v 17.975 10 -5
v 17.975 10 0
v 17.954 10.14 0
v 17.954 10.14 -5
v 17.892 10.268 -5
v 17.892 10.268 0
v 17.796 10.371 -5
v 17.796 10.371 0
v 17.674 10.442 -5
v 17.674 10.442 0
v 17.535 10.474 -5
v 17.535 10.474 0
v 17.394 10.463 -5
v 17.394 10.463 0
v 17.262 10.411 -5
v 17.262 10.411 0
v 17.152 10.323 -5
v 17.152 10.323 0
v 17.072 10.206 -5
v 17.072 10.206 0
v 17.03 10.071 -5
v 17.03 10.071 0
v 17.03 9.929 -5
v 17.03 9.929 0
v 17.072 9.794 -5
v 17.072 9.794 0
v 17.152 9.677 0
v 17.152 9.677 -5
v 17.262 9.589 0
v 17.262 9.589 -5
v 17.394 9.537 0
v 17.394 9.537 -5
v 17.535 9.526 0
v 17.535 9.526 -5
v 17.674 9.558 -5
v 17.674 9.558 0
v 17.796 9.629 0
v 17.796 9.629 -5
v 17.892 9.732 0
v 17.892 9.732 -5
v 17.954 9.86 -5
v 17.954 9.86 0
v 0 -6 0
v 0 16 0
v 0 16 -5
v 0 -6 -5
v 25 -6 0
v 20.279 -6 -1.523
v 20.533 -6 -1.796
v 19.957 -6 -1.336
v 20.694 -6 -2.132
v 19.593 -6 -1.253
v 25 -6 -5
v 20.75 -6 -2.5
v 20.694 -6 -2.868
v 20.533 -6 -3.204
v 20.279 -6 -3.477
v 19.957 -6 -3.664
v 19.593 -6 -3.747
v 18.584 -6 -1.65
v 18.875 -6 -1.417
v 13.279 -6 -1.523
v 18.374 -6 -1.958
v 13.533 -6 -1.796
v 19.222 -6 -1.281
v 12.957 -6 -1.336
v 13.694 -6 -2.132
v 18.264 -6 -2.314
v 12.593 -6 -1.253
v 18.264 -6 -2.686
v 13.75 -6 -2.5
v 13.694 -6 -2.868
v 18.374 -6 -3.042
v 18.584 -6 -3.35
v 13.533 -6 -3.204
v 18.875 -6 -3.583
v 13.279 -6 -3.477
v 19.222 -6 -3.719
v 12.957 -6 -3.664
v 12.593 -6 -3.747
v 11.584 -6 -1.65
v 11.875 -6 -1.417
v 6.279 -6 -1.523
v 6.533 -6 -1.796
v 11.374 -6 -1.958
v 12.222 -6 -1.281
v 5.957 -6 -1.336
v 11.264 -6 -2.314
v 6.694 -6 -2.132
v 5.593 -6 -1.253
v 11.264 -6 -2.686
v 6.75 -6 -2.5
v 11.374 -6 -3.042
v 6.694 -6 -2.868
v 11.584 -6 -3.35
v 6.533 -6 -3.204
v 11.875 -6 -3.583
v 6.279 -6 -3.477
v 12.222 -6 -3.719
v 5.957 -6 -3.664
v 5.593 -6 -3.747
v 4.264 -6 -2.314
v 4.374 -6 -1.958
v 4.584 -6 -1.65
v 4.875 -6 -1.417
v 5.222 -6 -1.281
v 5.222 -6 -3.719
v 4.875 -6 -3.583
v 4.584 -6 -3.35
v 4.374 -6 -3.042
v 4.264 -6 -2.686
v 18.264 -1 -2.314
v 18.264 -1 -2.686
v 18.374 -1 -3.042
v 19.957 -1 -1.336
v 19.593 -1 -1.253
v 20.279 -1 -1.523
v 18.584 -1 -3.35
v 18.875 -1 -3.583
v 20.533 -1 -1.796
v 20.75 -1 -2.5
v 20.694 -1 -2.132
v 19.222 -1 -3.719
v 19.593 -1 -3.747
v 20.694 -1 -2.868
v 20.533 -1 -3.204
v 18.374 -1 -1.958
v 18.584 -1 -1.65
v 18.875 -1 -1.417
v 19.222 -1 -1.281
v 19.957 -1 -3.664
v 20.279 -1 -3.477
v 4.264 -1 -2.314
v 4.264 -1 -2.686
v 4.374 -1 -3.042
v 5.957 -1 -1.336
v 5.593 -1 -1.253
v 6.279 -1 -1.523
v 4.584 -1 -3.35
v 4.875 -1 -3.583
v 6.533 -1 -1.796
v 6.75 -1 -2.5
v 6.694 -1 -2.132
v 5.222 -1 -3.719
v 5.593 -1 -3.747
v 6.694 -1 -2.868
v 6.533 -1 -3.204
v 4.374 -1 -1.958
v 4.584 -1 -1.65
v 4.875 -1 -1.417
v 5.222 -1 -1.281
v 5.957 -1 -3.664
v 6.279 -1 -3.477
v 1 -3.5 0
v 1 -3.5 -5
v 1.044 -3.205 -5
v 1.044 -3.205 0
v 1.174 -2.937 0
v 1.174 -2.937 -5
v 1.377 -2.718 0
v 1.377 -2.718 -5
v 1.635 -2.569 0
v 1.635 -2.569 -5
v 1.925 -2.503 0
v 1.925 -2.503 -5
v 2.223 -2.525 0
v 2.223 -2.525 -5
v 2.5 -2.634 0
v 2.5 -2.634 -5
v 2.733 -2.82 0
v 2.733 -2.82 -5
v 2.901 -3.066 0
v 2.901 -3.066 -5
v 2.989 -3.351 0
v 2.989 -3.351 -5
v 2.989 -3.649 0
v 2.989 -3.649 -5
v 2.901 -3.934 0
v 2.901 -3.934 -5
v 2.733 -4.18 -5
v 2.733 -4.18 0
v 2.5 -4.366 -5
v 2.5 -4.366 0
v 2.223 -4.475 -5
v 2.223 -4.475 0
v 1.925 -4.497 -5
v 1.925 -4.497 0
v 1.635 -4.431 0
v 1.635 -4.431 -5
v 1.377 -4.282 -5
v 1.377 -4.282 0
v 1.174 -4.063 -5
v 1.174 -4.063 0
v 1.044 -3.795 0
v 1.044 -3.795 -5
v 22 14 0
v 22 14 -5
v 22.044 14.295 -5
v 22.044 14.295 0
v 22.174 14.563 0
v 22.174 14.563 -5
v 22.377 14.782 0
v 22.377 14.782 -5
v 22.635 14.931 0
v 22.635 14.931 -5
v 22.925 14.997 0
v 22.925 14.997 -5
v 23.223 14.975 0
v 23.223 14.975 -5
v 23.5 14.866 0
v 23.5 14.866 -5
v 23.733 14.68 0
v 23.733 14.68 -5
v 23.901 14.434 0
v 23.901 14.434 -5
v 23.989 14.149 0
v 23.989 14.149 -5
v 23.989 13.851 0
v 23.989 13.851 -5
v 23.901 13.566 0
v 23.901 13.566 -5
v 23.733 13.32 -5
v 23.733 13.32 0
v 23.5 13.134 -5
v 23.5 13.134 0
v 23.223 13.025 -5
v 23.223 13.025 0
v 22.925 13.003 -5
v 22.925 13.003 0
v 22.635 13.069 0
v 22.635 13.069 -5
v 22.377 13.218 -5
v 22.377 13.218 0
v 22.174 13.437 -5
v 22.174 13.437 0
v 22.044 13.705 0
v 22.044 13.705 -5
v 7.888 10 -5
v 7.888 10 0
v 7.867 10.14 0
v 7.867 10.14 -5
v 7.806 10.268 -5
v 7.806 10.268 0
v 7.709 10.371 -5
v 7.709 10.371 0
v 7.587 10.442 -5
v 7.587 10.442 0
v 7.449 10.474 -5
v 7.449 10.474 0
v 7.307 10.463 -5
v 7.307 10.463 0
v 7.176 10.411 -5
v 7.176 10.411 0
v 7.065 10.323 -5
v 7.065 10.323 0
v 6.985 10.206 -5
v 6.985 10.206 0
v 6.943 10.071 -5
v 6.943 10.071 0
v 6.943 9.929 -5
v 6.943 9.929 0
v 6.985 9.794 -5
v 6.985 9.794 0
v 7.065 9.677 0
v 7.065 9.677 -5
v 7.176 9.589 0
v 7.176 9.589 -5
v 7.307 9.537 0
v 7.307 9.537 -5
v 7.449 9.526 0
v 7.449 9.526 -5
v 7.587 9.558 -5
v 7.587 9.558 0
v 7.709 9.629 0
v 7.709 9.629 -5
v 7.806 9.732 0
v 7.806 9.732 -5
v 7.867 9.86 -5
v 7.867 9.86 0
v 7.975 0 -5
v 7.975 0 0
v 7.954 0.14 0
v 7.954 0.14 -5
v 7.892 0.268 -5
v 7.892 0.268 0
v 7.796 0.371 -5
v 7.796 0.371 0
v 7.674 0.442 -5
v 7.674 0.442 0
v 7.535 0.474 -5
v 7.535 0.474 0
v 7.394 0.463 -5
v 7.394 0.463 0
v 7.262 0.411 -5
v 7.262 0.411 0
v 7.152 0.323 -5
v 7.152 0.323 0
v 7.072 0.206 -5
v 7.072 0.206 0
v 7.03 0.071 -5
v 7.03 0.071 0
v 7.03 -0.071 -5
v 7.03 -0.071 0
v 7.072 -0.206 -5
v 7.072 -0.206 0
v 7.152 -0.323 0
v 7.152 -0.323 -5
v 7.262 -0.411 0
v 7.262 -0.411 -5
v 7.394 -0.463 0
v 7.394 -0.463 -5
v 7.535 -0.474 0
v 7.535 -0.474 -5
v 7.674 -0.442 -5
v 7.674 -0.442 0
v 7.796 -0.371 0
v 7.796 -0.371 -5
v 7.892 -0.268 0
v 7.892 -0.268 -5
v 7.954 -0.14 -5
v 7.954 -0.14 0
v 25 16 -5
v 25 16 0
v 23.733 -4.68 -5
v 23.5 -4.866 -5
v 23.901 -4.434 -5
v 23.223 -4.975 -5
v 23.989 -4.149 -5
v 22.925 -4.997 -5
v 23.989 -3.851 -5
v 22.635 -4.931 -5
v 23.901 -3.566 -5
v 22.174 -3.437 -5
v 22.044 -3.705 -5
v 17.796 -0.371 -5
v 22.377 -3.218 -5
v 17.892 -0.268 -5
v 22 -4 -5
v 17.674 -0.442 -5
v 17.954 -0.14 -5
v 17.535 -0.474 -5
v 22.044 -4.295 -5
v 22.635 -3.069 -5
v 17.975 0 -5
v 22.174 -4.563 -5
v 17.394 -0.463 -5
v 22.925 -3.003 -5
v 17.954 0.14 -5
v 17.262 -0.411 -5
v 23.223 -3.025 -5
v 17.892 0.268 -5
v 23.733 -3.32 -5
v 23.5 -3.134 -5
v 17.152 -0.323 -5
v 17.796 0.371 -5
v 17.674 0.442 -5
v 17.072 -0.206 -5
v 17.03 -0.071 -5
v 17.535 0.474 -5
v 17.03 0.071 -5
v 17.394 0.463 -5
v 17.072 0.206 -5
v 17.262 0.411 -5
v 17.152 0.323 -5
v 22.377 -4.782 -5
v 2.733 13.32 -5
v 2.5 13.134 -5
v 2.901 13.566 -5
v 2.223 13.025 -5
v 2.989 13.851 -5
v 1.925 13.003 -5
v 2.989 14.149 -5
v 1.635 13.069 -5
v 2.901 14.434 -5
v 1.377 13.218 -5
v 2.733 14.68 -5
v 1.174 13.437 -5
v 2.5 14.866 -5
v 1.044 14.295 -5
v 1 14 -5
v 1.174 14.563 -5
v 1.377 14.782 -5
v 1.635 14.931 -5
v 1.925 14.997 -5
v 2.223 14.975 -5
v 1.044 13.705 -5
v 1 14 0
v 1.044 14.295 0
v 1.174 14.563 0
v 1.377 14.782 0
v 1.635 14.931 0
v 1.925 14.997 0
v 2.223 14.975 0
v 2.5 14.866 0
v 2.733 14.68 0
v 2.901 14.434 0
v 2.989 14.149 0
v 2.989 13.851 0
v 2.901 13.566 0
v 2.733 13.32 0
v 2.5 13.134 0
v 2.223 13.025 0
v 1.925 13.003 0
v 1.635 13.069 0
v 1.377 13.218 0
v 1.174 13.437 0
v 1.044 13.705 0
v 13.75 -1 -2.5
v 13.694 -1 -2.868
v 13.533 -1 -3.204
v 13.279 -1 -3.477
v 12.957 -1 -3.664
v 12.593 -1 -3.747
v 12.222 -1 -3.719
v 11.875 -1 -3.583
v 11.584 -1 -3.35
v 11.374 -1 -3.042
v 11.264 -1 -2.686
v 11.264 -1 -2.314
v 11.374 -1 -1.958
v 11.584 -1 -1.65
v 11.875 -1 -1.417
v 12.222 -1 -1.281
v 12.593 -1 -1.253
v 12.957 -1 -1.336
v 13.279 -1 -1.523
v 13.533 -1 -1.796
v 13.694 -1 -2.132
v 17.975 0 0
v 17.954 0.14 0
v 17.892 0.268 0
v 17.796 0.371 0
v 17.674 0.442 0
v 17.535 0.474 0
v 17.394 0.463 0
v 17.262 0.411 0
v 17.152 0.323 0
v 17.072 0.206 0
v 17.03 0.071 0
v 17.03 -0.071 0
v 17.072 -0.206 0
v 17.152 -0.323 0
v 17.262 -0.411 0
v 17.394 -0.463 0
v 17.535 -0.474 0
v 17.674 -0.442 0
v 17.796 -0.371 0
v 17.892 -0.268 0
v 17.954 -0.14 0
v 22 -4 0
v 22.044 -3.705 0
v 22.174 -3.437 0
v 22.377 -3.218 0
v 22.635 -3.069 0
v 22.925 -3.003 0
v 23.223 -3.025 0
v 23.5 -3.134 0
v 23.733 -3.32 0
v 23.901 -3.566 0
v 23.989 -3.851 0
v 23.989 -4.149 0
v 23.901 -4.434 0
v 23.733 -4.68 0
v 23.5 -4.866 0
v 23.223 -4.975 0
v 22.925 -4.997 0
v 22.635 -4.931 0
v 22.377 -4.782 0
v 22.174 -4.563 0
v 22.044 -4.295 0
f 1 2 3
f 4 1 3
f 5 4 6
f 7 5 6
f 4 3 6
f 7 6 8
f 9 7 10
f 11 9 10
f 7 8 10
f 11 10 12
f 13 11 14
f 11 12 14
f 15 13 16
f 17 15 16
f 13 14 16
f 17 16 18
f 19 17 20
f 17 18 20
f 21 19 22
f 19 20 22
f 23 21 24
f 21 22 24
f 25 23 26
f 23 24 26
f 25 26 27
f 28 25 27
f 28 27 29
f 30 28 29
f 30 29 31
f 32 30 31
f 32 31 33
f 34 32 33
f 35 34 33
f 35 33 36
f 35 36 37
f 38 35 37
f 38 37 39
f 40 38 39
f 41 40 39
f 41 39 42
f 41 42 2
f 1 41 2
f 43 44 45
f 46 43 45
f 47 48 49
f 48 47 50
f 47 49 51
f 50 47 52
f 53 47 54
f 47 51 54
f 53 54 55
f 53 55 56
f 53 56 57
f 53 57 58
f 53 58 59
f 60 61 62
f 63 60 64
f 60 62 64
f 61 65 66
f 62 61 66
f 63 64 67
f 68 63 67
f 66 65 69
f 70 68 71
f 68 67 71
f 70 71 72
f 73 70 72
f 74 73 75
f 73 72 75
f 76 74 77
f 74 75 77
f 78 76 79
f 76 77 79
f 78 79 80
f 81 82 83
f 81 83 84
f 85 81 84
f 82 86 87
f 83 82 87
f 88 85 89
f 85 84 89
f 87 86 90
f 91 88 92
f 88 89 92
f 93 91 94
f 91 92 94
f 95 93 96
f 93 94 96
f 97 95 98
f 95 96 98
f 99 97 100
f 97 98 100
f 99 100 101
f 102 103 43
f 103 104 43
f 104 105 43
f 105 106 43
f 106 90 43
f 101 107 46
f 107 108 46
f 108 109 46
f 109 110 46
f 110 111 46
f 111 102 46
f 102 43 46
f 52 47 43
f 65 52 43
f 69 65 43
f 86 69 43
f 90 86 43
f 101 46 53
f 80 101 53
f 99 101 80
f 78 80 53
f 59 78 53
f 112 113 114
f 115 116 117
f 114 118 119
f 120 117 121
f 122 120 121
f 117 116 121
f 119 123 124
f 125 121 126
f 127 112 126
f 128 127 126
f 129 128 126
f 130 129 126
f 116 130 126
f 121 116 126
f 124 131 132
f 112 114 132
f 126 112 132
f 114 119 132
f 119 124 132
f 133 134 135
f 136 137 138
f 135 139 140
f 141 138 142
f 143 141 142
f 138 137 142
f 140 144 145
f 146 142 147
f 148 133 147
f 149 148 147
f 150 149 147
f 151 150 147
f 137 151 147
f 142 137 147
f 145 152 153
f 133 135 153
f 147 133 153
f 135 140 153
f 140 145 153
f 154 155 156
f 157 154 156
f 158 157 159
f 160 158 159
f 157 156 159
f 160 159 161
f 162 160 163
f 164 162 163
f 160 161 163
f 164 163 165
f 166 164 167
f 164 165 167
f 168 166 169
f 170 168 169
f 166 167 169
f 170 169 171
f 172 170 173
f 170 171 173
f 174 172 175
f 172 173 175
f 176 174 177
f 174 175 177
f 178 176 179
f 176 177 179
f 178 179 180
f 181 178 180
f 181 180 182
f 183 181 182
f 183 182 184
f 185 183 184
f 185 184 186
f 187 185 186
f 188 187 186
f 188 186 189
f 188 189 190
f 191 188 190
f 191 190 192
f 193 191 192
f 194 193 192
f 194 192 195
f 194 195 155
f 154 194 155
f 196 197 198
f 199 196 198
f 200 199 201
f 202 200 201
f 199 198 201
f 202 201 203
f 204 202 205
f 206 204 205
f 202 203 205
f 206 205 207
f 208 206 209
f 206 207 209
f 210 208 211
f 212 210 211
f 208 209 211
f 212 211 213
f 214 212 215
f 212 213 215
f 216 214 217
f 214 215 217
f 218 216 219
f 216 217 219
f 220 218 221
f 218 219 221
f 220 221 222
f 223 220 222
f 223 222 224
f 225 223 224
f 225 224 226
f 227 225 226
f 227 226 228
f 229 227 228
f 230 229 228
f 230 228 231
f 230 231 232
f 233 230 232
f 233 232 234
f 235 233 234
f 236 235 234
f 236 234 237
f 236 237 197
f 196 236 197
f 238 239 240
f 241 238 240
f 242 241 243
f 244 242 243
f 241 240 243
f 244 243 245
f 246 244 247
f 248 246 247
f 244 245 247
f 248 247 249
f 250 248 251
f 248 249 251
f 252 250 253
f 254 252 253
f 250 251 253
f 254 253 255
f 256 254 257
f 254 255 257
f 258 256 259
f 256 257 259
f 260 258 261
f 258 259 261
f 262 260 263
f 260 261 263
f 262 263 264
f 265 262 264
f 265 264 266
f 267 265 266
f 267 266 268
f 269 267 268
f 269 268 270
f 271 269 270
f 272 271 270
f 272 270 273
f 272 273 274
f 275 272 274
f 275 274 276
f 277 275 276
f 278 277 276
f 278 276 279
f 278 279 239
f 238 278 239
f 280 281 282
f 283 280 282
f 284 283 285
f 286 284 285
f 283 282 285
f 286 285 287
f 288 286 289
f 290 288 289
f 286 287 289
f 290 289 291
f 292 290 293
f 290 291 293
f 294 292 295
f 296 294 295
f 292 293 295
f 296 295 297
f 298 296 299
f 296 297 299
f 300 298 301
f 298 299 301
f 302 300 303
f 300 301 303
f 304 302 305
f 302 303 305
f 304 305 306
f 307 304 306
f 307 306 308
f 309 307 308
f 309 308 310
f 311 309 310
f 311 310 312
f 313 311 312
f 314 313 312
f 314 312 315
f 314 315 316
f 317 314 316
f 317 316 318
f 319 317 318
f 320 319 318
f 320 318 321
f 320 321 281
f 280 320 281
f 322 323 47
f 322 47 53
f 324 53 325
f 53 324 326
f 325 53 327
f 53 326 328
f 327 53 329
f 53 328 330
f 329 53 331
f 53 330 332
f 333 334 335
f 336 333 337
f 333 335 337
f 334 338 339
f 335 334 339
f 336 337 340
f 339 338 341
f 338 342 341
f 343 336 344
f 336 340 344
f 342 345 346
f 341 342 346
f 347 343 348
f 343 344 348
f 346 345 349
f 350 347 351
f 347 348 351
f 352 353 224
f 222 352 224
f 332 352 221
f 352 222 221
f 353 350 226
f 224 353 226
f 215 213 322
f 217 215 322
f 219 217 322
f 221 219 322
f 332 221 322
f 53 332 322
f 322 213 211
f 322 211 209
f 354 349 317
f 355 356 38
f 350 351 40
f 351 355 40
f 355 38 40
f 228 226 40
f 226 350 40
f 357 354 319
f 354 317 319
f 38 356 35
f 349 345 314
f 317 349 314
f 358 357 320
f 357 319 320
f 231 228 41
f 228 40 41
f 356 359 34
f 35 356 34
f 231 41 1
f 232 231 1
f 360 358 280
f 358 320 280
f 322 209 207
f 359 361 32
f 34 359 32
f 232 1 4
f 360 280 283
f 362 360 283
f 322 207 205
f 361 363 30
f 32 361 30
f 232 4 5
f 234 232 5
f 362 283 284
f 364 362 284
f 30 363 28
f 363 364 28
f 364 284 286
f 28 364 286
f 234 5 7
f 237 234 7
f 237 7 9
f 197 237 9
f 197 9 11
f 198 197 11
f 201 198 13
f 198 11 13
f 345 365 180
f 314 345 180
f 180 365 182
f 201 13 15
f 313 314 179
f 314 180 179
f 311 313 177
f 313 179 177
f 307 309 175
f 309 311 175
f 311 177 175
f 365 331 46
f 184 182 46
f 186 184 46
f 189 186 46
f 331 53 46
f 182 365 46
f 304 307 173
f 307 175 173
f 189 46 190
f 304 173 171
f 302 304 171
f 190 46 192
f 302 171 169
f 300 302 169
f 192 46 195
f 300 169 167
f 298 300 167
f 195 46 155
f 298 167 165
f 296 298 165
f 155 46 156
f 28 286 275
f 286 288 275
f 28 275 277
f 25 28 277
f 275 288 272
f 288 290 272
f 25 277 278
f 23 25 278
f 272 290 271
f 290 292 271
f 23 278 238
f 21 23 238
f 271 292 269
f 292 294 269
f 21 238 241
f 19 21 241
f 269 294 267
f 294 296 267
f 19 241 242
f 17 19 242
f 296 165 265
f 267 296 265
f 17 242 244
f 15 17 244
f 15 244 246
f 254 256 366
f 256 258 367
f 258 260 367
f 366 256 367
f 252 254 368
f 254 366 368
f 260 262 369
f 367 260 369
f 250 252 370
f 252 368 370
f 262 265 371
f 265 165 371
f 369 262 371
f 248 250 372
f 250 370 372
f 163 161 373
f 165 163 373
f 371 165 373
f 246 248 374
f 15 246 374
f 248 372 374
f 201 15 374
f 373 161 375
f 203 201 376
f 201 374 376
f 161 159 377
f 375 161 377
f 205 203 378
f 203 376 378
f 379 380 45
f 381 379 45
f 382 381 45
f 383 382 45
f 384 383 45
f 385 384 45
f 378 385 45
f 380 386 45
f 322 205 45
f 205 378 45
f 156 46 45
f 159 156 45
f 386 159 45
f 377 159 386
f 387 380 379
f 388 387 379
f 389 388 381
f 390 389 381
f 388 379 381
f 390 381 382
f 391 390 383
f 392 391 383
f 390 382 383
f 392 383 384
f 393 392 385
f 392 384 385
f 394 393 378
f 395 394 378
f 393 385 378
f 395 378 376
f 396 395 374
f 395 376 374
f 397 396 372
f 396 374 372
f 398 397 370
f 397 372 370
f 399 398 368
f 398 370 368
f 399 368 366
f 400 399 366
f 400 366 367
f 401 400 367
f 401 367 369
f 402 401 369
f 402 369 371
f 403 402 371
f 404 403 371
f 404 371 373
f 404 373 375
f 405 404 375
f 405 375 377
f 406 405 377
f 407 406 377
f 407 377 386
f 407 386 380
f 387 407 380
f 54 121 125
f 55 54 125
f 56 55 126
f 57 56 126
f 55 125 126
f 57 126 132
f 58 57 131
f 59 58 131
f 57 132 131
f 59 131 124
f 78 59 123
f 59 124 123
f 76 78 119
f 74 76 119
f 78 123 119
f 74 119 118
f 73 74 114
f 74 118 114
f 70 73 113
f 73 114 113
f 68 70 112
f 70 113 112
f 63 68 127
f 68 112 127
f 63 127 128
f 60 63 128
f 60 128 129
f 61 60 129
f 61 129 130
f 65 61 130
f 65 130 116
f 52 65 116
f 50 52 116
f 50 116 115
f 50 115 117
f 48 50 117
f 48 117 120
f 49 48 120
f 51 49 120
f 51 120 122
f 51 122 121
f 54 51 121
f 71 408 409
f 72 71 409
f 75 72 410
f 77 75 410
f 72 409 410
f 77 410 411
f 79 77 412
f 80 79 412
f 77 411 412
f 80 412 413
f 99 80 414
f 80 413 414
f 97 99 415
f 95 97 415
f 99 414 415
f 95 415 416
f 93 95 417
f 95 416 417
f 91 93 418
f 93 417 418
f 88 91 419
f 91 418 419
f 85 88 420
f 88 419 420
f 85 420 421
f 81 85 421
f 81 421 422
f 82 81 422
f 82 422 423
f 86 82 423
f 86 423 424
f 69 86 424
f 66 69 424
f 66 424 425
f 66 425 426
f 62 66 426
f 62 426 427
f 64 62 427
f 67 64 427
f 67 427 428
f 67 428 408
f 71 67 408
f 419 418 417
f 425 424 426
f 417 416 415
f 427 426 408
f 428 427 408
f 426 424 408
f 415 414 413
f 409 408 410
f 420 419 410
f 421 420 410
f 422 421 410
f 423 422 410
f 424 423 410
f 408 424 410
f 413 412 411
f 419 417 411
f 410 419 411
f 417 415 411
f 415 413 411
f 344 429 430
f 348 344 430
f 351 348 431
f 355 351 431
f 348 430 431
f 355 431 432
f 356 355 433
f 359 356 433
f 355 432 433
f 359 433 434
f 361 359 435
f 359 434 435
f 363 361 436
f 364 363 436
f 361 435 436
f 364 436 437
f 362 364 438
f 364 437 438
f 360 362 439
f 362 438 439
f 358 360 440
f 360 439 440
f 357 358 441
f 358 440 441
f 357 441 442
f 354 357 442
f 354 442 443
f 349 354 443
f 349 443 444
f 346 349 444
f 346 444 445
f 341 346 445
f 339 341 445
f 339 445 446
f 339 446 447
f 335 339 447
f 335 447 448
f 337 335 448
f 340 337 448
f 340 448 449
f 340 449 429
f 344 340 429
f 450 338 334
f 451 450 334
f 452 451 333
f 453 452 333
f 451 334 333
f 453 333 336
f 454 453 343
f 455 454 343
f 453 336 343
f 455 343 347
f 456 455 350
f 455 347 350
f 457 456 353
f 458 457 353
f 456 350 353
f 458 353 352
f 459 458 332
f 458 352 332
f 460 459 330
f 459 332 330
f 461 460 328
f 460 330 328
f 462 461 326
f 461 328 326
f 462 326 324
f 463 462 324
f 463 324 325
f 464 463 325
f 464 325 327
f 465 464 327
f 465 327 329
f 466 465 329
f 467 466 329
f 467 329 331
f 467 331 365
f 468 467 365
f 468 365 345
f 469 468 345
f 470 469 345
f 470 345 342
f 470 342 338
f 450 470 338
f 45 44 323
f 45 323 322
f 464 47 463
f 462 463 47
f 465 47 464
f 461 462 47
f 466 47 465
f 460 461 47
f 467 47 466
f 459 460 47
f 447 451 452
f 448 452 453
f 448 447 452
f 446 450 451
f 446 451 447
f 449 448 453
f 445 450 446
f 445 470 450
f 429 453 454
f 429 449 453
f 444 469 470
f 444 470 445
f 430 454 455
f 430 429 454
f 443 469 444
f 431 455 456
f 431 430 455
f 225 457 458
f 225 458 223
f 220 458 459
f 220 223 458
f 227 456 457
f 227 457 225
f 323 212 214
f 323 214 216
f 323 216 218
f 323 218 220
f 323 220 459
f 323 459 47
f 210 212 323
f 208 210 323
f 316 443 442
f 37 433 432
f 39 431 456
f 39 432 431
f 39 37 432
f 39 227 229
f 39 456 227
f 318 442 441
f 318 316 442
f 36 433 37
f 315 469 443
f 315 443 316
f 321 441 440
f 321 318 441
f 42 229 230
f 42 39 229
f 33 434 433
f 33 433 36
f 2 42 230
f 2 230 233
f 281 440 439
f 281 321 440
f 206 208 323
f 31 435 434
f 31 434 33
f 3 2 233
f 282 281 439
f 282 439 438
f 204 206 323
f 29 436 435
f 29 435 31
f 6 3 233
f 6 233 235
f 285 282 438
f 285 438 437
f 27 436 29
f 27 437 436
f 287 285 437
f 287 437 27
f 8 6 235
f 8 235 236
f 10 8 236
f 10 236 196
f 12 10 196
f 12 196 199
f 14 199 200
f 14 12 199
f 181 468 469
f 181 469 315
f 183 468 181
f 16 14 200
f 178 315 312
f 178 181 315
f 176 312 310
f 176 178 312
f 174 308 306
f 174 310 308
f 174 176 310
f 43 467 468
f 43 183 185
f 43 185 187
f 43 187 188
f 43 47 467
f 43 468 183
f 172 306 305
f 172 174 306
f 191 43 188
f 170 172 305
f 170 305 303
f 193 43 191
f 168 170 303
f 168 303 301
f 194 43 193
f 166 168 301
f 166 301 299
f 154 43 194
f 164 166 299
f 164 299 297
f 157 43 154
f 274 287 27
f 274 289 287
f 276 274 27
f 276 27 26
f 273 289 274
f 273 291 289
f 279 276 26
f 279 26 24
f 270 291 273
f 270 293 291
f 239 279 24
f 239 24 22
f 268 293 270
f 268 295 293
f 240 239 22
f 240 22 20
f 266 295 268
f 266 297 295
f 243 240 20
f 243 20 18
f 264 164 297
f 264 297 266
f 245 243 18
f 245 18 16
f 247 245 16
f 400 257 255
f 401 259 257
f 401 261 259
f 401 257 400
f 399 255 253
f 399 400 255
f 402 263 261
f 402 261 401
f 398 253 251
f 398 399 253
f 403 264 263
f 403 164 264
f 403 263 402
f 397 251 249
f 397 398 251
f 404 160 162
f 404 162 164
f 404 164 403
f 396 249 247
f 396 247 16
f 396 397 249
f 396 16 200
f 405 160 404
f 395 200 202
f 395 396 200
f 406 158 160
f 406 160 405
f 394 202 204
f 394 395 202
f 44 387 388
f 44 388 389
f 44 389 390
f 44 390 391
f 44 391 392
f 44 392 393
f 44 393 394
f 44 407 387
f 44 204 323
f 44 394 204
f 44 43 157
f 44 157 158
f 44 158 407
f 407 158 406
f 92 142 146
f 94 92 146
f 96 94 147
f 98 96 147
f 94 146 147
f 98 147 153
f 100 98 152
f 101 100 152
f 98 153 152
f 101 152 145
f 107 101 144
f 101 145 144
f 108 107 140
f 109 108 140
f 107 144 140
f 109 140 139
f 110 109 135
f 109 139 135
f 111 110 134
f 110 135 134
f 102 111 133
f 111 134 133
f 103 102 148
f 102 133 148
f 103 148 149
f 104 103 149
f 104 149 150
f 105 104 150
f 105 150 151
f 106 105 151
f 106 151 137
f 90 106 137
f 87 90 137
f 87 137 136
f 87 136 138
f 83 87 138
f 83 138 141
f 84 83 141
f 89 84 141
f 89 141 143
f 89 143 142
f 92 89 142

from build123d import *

# Parameters (mm, degrees)
SKETCH2_W                          = 5
SKETCH2_H                          = 22
BOSS_EXTRUDE1_DEPTH                = 25
TAP_DRILL_FOR_M2_5X0_45_TAP1_D     = 2.5
TAP_DRILL_FOR_M2_5X0_45_TAP1_DEPTH = 5
TAP_DRILL_FOR_M1_2X0_25_TAP1_D     = 0.95
TAP_DRILL_FOR_M2X0_4_TAP1_D        = 2


with BuildPart() as part:
    # Sketch2 → Boss-Extrude1 (new body)
    with BuildSketch(Plane(origin=(0, 0, 0), x_dir=(0, 0, -1), z_dir=(1, 0, 0))):
        with Locations((2.5, 5)):
            Rectangle(SKETCH2_W, SKETCH2_H)
    extrude(amount=BOSS_EXTRUDE1_DEPTH)

    # Tap Drill for M2.5x0.45 Tap1
    with Locations(Plane(origin=(0, -6, 0), x_dir=(-1, 0, 0), z_dir=(0, -1, 0))):
        with Locations((-19.5, 2.5), (-12.5, 2.5), (-5.5, 2.5)):
            Hole(TAP_DRILL_FOR_M2_5X0_45_TAP1_D / 2, depth=TAP_DRILL_FOR_M2_5X0_45_TAP1_DEPTH)

    # Tap Drill for M1.2x0.25 Tap1 (through all)
    with Locations(Plane(origin=(0, 0, -5), x_dir=(-1, 0, 0), z_dir=(0, 0, -1))):
        with Locations((-17.5, 10), (-7.413132908, 10), (-17.5, 0), (-7.5, 0)):
            Hole(TAP_DRILL_FOR_M1_2X0_25_TAP1_D / 2)

    # Tap Drill for M2x0.4 Tap1 (through all)
    with Locations(Plane.XY):
        with Locations((2, 14), (2, -3.5), (23, -4), (23, 14)):
            Hole(TAP_DRILL_FOR_M2X0_4_TAP1_D / 2)


solid = part.part
